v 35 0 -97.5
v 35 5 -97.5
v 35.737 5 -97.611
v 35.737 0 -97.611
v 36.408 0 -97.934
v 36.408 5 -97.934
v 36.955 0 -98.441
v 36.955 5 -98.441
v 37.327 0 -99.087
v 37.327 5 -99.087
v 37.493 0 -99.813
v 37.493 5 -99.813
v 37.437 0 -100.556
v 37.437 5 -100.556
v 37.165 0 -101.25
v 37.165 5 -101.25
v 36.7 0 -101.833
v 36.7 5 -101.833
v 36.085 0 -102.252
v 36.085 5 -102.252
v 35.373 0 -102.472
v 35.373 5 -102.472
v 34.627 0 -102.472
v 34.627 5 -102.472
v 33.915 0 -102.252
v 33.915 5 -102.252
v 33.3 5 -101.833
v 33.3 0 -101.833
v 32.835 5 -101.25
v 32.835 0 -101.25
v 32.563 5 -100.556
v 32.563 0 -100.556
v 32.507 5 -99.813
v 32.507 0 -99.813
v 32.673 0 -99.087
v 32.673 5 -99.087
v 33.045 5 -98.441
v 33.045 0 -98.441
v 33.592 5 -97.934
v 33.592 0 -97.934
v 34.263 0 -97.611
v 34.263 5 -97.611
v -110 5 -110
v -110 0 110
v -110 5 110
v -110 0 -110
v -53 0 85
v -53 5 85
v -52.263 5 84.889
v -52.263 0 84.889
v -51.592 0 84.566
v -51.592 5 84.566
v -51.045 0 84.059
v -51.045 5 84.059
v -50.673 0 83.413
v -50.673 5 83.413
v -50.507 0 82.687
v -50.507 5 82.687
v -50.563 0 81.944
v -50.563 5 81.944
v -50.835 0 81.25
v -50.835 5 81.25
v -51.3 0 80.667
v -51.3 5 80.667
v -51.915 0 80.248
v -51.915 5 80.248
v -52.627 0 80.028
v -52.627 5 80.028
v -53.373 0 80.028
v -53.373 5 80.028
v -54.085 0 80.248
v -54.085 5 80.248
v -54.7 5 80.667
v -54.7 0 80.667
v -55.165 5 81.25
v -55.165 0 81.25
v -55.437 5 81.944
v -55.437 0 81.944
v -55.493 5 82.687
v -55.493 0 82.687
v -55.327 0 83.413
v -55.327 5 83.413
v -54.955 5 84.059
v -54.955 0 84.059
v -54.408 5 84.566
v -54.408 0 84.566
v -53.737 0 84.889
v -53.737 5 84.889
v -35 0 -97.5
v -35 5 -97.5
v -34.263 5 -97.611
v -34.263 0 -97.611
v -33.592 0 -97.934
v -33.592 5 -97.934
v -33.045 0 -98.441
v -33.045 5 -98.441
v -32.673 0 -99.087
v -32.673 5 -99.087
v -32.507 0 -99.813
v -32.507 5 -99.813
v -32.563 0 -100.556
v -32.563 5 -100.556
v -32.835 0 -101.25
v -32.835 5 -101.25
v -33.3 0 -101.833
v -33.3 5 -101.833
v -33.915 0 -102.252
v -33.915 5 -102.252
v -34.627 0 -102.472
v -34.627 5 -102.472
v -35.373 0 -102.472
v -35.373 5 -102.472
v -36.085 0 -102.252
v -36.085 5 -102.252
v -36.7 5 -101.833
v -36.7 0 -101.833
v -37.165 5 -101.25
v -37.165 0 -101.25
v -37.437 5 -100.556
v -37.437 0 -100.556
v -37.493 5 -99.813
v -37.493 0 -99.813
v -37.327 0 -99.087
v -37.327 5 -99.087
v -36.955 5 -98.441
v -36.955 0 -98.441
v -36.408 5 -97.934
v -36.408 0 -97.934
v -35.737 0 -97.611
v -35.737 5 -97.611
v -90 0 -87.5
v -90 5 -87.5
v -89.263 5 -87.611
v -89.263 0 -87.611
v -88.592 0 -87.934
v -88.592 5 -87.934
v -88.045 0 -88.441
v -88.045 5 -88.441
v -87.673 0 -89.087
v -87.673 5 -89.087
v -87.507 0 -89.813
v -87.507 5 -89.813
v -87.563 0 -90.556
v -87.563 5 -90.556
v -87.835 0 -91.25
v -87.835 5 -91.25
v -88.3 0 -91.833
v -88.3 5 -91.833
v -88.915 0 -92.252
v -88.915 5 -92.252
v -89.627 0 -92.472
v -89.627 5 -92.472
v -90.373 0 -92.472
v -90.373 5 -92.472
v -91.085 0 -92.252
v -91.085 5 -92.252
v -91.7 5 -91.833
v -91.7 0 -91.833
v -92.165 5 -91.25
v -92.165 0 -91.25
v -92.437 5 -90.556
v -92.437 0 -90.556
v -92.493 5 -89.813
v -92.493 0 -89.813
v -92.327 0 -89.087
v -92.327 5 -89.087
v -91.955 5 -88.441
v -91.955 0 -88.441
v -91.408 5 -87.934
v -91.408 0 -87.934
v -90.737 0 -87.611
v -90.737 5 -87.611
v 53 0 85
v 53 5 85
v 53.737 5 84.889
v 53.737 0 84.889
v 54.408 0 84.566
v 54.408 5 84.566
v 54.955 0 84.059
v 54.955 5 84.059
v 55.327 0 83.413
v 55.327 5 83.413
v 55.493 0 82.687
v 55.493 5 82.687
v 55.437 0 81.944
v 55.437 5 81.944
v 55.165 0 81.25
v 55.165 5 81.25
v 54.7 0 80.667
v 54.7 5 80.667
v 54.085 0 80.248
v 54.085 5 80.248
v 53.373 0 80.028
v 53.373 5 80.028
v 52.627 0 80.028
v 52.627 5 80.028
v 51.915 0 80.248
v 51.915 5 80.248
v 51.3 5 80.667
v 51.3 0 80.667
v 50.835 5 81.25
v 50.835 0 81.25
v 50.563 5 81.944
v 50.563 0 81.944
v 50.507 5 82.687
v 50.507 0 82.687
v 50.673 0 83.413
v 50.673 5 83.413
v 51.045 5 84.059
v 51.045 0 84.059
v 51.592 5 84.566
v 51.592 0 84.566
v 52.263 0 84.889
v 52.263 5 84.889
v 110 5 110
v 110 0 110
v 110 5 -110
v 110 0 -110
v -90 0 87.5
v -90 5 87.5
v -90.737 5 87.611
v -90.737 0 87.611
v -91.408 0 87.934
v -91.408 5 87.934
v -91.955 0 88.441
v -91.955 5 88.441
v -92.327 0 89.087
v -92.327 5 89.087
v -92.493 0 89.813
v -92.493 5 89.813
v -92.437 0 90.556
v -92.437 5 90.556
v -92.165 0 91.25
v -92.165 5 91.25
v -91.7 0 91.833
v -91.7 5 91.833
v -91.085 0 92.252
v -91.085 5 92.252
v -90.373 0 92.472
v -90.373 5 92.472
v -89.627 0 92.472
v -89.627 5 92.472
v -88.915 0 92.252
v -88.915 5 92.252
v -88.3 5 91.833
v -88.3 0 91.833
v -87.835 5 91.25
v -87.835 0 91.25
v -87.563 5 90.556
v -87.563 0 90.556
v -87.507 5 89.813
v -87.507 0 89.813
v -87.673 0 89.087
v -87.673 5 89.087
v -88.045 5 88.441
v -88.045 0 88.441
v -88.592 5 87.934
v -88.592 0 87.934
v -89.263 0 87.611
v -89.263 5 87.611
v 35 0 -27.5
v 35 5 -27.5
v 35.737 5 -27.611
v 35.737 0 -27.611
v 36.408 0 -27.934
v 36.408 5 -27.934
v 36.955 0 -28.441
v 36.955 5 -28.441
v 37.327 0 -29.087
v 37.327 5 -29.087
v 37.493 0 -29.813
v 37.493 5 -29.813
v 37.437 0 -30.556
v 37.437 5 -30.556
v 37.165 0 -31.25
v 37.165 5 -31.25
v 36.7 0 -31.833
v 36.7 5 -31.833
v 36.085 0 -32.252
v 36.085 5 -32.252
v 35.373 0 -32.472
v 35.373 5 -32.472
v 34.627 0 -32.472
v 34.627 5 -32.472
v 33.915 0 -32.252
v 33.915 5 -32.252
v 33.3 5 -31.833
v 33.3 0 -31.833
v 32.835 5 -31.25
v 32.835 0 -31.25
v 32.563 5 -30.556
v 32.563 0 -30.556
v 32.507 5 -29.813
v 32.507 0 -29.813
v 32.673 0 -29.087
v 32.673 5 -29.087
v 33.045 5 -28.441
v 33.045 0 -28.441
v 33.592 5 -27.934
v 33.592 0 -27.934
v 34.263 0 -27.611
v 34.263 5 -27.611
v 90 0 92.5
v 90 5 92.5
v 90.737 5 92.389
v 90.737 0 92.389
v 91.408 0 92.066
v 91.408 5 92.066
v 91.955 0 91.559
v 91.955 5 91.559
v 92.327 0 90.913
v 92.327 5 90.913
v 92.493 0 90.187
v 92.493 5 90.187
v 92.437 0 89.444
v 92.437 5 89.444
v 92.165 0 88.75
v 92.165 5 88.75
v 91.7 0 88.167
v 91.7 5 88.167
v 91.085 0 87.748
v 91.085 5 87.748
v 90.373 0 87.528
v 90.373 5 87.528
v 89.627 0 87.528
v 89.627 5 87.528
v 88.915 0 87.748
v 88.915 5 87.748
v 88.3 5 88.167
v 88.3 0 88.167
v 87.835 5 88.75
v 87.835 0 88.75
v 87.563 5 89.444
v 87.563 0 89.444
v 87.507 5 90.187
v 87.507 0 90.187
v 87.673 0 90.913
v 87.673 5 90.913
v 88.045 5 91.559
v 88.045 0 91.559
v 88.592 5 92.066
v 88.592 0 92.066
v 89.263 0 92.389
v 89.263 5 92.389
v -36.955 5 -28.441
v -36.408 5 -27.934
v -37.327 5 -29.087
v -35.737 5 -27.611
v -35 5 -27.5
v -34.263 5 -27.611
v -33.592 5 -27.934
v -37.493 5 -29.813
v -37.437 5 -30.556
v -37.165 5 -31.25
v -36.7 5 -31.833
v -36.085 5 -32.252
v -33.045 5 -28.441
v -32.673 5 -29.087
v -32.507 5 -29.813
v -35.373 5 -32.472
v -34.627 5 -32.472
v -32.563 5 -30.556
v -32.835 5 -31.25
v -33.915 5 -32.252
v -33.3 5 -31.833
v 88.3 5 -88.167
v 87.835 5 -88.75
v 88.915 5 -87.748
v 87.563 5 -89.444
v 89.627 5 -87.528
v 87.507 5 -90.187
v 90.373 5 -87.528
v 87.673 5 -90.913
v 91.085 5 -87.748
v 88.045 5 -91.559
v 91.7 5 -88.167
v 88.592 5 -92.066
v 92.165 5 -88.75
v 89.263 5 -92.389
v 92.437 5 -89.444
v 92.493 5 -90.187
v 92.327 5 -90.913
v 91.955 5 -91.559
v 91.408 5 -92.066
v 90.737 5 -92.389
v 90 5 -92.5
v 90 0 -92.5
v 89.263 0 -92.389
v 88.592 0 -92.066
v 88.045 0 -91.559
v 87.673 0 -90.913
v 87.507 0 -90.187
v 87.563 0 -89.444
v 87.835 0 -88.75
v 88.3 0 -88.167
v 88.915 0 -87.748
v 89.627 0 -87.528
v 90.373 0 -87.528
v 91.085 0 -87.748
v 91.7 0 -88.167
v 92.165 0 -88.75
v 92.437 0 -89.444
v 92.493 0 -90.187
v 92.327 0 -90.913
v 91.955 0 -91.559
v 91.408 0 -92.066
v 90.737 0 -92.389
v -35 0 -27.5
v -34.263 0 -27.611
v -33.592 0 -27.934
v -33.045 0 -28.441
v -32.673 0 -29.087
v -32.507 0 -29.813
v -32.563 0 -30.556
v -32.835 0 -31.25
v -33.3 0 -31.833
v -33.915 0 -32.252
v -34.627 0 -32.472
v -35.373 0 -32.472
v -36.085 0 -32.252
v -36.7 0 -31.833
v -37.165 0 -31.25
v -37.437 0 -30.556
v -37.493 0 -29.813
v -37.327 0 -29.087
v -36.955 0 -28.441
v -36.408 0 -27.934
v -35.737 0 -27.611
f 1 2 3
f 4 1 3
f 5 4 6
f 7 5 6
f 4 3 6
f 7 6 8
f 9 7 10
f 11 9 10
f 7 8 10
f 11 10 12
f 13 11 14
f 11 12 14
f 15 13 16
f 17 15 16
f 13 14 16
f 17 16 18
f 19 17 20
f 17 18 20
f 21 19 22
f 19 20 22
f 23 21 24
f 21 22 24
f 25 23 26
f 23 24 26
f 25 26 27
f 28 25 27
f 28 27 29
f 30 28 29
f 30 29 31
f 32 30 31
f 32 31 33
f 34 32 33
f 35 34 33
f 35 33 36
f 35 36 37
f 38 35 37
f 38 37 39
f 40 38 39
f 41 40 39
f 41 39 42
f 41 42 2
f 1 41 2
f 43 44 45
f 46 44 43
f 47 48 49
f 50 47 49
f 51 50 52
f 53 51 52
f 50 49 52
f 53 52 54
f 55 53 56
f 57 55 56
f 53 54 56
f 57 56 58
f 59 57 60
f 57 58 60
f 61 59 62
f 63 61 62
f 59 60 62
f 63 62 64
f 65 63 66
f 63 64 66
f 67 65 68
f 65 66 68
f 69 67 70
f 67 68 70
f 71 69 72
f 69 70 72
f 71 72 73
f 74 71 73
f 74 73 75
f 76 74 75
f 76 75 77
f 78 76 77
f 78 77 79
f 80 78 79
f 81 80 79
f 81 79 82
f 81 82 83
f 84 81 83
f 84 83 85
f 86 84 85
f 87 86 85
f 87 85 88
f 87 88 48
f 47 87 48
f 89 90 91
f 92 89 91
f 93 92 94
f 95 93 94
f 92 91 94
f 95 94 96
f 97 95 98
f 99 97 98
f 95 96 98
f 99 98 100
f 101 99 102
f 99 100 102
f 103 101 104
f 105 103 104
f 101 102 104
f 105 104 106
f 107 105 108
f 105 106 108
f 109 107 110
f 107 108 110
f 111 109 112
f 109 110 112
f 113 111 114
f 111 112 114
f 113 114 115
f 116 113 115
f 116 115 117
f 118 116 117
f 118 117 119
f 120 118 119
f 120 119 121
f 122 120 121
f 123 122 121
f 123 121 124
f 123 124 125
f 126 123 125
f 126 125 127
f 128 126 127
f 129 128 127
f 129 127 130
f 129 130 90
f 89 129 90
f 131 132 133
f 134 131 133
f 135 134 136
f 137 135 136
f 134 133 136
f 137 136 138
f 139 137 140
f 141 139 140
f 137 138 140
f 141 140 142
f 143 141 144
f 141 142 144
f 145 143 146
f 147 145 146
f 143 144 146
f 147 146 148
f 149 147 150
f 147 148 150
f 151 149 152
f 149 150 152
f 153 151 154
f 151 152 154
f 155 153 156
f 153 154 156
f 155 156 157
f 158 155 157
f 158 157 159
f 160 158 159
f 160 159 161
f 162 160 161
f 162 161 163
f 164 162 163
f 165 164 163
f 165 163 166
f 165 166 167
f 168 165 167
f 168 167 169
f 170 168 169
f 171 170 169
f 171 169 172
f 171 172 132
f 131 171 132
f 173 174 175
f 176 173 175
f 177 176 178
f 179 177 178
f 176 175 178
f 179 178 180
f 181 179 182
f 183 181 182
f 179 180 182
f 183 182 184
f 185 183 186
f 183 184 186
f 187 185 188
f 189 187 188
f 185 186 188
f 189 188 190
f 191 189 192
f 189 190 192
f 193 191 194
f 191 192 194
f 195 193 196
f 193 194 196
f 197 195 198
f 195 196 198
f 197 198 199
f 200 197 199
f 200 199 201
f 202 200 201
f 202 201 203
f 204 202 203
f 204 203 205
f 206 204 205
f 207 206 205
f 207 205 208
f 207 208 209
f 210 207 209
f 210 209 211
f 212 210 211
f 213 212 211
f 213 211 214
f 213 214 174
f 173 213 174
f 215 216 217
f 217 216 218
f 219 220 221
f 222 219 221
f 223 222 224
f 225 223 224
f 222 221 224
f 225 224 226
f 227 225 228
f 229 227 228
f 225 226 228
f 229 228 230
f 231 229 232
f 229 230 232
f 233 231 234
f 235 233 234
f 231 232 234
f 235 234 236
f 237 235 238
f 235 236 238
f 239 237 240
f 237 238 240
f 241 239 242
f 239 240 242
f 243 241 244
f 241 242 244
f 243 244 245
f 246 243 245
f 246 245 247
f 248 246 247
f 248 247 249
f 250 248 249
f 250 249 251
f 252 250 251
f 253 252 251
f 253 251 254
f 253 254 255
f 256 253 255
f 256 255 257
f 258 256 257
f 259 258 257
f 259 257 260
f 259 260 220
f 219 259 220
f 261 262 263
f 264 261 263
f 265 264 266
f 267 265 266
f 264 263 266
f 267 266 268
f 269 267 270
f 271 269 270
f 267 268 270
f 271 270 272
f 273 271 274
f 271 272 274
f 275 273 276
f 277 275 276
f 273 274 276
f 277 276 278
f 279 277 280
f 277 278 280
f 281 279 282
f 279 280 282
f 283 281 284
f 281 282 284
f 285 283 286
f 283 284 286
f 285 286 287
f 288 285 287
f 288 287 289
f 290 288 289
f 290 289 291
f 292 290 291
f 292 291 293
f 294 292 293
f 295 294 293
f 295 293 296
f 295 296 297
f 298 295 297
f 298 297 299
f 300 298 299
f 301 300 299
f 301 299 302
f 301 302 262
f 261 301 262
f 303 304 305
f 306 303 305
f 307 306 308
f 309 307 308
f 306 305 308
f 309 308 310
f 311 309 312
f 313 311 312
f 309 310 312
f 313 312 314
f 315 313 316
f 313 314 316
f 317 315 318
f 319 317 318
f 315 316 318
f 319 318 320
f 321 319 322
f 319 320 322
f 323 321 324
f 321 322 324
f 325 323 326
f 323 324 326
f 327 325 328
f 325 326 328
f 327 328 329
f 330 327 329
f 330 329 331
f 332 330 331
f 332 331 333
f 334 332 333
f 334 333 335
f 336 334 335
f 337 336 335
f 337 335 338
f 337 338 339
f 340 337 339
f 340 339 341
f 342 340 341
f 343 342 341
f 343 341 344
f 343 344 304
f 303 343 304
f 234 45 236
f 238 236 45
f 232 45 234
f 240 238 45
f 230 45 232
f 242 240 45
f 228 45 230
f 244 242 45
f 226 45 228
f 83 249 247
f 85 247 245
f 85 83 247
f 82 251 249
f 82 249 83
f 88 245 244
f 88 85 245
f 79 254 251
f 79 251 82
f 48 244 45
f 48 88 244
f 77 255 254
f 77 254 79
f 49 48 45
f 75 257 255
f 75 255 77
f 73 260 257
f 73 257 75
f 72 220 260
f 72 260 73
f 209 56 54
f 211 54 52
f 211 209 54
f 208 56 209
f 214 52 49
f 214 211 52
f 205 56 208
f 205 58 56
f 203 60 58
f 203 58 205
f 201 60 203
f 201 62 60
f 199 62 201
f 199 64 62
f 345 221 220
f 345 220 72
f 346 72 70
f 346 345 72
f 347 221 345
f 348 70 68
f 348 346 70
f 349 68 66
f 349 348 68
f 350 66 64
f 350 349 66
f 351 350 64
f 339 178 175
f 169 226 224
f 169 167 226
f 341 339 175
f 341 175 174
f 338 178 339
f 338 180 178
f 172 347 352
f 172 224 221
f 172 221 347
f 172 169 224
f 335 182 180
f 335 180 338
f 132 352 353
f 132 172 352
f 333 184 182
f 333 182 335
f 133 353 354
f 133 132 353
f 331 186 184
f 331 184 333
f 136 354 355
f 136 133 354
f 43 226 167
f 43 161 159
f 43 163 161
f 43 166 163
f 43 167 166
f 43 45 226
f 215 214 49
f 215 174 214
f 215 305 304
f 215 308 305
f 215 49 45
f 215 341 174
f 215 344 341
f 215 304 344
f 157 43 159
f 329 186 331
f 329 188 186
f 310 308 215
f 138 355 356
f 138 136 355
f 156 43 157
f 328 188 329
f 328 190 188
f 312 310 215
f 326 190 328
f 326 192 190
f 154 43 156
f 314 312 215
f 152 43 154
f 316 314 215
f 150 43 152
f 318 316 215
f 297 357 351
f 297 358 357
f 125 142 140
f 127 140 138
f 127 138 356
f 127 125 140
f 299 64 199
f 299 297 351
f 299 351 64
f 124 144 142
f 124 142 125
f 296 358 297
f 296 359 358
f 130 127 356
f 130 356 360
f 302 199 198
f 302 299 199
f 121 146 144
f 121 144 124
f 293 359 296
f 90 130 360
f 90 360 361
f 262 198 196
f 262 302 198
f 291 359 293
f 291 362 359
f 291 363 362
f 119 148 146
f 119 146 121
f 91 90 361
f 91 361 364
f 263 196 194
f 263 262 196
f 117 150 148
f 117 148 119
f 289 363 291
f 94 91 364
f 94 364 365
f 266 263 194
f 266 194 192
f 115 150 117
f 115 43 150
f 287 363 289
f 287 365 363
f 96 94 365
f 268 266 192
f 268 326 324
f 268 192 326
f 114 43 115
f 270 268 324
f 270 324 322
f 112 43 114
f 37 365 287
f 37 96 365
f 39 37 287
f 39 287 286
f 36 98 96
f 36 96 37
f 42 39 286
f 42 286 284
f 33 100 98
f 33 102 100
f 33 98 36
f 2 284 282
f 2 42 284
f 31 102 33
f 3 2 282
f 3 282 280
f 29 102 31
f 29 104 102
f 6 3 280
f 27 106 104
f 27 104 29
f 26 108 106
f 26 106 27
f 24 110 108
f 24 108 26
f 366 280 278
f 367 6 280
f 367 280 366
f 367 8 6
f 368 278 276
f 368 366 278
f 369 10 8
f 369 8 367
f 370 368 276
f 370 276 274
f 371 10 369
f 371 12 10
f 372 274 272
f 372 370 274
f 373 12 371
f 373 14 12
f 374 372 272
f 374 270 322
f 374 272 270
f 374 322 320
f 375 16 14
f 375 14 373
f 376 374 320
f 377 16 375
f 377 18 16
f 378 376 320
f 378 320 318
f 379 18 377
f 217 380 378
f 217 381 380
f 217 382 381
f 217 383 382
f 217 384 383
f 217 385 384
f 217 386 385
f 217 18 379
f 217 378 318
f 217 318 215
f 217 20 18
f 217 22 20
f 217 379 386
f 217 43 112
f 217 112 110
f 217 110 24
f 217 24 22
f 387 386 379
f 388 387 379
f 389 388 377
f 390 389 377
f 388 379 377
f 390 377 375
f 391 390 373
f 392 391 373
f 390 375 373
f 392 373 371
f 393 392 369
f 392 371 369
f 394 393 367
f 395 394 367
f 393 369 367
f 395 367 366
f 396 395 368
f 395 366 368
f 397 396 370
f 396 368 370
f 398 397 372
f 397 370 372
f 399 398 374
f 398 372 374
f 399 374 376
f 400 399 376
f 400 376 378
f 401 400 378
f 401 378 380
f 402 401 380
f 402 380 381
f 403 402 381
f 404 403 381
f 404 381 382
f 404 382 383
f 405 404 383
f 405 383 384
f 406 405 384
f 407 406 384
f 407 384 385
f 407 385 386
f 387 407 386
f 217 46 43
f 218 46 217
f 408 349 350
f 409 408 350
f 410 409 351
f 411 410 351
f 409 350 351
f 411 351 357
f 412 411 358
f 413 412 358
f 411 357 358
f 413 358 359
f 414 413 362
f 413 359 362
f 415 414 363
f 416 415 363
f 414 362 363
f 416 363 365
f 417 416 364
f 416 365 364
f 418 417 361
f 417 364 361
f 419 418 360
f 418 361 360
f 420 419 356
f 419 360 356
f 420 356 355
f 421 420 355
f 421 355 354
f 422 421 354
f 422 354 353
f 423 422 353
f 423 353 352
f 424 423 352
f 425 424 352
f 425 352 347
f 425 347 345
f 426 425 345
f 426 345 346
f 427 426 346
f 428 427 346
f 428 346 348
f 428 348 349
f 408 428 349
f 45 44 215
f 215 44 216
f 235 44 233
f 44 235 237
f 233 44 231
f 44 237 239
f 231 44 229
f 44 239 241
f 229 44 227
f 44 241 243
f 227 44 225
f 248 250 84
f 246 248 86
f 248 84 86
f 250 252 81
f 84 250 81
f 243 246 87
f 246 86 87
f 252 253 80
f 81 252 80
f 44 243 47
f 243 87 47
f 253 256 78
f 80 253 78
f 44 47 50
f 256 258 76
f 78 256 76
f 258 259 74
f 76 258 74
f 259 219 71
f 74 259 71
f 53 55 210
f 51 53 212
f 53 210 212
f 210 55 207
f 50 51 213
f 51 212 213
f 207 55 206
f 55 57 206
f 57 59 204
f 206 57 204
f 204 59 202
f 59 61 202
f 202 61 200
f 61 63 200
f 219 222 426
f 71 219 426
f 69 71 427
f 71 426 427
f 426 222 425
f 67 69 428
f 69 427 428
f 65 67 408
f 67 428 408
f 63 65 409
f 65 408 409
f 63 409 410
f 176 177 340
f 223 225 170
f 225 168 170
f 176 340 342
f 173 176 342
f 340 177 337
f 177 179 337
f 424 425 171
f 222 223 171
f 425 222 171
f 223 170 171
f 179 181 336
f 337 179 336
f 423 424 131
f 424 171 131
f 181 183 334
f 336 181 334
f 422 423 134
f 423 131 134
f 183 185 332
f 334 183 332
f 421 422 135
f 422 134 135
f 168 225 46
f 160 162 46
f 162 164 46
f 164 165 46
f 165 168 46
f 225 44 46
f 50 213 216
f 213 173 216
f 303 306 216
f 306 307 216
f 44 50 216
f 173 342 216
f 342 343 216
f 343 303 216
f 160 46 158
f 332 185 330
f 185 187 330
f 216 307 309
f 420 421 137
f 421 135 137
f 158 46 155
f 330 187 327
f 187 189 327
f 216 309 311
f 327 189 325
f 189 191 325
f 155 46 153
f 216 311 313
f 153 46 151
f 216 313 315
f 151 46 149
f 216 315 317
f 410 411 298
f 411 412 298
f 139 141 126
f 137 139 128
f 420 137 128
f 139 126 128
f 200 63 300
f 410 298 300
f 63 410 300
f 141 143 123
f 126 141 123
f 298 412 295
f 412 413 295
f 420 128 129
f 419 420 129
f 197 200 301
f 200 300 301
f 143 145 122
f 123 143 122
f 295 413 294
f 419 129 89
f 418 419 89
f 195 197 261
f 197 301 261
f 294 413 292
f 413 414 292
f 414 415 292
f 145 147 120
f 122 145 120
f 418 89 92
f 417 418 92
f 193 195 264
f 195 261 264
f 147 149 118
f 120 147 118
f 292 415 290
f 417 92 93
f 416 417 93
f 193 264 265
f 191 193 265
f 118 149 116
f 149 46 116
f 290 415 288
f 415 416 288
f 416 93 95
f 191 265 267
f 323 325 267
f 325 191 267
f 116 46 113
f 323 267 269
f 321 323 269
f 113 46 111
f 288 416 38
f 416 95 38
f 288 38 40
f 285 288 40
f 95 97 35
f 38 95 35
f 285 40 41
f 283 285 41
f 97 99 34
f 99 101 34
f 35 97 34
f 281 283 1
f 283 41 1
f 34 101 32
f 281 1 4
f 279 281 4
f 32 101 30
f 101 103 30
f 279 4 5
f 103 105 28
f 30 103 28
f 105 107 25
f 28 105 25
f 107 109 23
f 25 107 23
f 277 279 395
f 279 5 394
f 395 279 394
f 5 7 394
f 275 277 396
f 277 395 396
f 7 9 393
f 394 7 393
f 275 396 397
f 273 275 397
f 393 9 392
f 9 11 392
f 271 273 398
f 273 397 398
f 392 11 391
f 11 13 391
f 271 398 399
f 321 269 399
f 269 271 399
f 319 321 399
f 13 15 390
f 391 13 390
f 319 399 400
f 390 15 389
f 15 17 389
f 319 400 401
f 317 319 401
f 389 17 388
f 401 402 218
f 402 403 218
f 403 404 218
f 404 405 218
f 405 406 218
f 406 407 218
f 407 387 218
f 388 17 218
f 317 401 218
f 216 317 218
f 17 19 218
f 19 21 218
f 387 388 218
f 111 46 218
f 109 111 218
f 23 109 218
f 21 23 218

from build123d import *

# Parameters (mm, degrees)
CROQUIS1_W              = 220
CROQUIS1_H              = 220
SALIENTE_EXTRUIR1_DEPTH = 5
CROQUIS2_R              = 2.5
CORTAR_EXTRUIR1_DEPTH   = 156.643824163
CROQUIS3_R              = 2.5
CORTAR_EXTRUIR2_DEPTH   = 10


with BuildPart() as part:
    # Croquis1 → Saliente-Extruir1 (new body)
    with BuildSketch(Plane(origin=(0, 0, 0), x_dir=(1, 0, 0), z_dir=(0, 1, 0))):
        Rectangle(CROQUIS1_W, CROQUIS1_H)
    extrude(amount=SALIENTE_EXTRUIR1_DEPTH)

    # Croquis2 → Cortar-Extruir1 (cut, through all)
    with BuildSketch(Plane(origin=(0, 5, 0), x_dir=(1, 0, 0), z_dir=(0, 1, 0))):
        with Locations(Location((-90, 90, 0), (0, 0, 270))):
            Circle(CROQUIS2_R)
        with Locations(Location((90, 90, 0), (0, 0, 90))):
            Circle(CROQUIS2_R)
        with Locations(Location((90, -90, 0), (0, 0, 270))):
            Circle(CROQUIS2_R)
        with Locations(Location((-90, -90, 0), (0, 0, 90))):
            Circle(CROQUIS2_R)
    extrude(amount=-CORTAR_EXTRUIR1_DEPTH, mode=Mode.SUBTRACT)

    # Croquis3 → Cortar-Extruir2 (cut)
    with BuildSketch(Plane(origin=(0, 5, 0), x_dir=(1, 0, 0), z_dir=(0, 1, 0))):
        with Locations(Location((-35, 100, 0), (0, 0, 270))):
            Circle(CROQUIS3_R)
        with Locations(Location((35, 100, 0), (0, 0, 270))):
            Circle(CROQUIS3_R)
        with Locations(Location((-35, 30, 0), (0, 0, 270))):
            Circle(CROQUIS3_R)
        with Locations(Location((35, 30, 0), (0, 0, 270))):
            Circle(CROQUIS3_R)
        with Locations(Location((-53, -82.5, 0), (0, 0, 270))):
            Circle(CROQUIS3_R)
        with Locations(Location((53, -82.5, 0), (0, 0, 270))):
            Circle(CROQUIS3_R)
    extrude(amount=-CORTAR_EXTRUIR2_DEPTH, mode=Mode.SUBTRACT)


solid = part.part
